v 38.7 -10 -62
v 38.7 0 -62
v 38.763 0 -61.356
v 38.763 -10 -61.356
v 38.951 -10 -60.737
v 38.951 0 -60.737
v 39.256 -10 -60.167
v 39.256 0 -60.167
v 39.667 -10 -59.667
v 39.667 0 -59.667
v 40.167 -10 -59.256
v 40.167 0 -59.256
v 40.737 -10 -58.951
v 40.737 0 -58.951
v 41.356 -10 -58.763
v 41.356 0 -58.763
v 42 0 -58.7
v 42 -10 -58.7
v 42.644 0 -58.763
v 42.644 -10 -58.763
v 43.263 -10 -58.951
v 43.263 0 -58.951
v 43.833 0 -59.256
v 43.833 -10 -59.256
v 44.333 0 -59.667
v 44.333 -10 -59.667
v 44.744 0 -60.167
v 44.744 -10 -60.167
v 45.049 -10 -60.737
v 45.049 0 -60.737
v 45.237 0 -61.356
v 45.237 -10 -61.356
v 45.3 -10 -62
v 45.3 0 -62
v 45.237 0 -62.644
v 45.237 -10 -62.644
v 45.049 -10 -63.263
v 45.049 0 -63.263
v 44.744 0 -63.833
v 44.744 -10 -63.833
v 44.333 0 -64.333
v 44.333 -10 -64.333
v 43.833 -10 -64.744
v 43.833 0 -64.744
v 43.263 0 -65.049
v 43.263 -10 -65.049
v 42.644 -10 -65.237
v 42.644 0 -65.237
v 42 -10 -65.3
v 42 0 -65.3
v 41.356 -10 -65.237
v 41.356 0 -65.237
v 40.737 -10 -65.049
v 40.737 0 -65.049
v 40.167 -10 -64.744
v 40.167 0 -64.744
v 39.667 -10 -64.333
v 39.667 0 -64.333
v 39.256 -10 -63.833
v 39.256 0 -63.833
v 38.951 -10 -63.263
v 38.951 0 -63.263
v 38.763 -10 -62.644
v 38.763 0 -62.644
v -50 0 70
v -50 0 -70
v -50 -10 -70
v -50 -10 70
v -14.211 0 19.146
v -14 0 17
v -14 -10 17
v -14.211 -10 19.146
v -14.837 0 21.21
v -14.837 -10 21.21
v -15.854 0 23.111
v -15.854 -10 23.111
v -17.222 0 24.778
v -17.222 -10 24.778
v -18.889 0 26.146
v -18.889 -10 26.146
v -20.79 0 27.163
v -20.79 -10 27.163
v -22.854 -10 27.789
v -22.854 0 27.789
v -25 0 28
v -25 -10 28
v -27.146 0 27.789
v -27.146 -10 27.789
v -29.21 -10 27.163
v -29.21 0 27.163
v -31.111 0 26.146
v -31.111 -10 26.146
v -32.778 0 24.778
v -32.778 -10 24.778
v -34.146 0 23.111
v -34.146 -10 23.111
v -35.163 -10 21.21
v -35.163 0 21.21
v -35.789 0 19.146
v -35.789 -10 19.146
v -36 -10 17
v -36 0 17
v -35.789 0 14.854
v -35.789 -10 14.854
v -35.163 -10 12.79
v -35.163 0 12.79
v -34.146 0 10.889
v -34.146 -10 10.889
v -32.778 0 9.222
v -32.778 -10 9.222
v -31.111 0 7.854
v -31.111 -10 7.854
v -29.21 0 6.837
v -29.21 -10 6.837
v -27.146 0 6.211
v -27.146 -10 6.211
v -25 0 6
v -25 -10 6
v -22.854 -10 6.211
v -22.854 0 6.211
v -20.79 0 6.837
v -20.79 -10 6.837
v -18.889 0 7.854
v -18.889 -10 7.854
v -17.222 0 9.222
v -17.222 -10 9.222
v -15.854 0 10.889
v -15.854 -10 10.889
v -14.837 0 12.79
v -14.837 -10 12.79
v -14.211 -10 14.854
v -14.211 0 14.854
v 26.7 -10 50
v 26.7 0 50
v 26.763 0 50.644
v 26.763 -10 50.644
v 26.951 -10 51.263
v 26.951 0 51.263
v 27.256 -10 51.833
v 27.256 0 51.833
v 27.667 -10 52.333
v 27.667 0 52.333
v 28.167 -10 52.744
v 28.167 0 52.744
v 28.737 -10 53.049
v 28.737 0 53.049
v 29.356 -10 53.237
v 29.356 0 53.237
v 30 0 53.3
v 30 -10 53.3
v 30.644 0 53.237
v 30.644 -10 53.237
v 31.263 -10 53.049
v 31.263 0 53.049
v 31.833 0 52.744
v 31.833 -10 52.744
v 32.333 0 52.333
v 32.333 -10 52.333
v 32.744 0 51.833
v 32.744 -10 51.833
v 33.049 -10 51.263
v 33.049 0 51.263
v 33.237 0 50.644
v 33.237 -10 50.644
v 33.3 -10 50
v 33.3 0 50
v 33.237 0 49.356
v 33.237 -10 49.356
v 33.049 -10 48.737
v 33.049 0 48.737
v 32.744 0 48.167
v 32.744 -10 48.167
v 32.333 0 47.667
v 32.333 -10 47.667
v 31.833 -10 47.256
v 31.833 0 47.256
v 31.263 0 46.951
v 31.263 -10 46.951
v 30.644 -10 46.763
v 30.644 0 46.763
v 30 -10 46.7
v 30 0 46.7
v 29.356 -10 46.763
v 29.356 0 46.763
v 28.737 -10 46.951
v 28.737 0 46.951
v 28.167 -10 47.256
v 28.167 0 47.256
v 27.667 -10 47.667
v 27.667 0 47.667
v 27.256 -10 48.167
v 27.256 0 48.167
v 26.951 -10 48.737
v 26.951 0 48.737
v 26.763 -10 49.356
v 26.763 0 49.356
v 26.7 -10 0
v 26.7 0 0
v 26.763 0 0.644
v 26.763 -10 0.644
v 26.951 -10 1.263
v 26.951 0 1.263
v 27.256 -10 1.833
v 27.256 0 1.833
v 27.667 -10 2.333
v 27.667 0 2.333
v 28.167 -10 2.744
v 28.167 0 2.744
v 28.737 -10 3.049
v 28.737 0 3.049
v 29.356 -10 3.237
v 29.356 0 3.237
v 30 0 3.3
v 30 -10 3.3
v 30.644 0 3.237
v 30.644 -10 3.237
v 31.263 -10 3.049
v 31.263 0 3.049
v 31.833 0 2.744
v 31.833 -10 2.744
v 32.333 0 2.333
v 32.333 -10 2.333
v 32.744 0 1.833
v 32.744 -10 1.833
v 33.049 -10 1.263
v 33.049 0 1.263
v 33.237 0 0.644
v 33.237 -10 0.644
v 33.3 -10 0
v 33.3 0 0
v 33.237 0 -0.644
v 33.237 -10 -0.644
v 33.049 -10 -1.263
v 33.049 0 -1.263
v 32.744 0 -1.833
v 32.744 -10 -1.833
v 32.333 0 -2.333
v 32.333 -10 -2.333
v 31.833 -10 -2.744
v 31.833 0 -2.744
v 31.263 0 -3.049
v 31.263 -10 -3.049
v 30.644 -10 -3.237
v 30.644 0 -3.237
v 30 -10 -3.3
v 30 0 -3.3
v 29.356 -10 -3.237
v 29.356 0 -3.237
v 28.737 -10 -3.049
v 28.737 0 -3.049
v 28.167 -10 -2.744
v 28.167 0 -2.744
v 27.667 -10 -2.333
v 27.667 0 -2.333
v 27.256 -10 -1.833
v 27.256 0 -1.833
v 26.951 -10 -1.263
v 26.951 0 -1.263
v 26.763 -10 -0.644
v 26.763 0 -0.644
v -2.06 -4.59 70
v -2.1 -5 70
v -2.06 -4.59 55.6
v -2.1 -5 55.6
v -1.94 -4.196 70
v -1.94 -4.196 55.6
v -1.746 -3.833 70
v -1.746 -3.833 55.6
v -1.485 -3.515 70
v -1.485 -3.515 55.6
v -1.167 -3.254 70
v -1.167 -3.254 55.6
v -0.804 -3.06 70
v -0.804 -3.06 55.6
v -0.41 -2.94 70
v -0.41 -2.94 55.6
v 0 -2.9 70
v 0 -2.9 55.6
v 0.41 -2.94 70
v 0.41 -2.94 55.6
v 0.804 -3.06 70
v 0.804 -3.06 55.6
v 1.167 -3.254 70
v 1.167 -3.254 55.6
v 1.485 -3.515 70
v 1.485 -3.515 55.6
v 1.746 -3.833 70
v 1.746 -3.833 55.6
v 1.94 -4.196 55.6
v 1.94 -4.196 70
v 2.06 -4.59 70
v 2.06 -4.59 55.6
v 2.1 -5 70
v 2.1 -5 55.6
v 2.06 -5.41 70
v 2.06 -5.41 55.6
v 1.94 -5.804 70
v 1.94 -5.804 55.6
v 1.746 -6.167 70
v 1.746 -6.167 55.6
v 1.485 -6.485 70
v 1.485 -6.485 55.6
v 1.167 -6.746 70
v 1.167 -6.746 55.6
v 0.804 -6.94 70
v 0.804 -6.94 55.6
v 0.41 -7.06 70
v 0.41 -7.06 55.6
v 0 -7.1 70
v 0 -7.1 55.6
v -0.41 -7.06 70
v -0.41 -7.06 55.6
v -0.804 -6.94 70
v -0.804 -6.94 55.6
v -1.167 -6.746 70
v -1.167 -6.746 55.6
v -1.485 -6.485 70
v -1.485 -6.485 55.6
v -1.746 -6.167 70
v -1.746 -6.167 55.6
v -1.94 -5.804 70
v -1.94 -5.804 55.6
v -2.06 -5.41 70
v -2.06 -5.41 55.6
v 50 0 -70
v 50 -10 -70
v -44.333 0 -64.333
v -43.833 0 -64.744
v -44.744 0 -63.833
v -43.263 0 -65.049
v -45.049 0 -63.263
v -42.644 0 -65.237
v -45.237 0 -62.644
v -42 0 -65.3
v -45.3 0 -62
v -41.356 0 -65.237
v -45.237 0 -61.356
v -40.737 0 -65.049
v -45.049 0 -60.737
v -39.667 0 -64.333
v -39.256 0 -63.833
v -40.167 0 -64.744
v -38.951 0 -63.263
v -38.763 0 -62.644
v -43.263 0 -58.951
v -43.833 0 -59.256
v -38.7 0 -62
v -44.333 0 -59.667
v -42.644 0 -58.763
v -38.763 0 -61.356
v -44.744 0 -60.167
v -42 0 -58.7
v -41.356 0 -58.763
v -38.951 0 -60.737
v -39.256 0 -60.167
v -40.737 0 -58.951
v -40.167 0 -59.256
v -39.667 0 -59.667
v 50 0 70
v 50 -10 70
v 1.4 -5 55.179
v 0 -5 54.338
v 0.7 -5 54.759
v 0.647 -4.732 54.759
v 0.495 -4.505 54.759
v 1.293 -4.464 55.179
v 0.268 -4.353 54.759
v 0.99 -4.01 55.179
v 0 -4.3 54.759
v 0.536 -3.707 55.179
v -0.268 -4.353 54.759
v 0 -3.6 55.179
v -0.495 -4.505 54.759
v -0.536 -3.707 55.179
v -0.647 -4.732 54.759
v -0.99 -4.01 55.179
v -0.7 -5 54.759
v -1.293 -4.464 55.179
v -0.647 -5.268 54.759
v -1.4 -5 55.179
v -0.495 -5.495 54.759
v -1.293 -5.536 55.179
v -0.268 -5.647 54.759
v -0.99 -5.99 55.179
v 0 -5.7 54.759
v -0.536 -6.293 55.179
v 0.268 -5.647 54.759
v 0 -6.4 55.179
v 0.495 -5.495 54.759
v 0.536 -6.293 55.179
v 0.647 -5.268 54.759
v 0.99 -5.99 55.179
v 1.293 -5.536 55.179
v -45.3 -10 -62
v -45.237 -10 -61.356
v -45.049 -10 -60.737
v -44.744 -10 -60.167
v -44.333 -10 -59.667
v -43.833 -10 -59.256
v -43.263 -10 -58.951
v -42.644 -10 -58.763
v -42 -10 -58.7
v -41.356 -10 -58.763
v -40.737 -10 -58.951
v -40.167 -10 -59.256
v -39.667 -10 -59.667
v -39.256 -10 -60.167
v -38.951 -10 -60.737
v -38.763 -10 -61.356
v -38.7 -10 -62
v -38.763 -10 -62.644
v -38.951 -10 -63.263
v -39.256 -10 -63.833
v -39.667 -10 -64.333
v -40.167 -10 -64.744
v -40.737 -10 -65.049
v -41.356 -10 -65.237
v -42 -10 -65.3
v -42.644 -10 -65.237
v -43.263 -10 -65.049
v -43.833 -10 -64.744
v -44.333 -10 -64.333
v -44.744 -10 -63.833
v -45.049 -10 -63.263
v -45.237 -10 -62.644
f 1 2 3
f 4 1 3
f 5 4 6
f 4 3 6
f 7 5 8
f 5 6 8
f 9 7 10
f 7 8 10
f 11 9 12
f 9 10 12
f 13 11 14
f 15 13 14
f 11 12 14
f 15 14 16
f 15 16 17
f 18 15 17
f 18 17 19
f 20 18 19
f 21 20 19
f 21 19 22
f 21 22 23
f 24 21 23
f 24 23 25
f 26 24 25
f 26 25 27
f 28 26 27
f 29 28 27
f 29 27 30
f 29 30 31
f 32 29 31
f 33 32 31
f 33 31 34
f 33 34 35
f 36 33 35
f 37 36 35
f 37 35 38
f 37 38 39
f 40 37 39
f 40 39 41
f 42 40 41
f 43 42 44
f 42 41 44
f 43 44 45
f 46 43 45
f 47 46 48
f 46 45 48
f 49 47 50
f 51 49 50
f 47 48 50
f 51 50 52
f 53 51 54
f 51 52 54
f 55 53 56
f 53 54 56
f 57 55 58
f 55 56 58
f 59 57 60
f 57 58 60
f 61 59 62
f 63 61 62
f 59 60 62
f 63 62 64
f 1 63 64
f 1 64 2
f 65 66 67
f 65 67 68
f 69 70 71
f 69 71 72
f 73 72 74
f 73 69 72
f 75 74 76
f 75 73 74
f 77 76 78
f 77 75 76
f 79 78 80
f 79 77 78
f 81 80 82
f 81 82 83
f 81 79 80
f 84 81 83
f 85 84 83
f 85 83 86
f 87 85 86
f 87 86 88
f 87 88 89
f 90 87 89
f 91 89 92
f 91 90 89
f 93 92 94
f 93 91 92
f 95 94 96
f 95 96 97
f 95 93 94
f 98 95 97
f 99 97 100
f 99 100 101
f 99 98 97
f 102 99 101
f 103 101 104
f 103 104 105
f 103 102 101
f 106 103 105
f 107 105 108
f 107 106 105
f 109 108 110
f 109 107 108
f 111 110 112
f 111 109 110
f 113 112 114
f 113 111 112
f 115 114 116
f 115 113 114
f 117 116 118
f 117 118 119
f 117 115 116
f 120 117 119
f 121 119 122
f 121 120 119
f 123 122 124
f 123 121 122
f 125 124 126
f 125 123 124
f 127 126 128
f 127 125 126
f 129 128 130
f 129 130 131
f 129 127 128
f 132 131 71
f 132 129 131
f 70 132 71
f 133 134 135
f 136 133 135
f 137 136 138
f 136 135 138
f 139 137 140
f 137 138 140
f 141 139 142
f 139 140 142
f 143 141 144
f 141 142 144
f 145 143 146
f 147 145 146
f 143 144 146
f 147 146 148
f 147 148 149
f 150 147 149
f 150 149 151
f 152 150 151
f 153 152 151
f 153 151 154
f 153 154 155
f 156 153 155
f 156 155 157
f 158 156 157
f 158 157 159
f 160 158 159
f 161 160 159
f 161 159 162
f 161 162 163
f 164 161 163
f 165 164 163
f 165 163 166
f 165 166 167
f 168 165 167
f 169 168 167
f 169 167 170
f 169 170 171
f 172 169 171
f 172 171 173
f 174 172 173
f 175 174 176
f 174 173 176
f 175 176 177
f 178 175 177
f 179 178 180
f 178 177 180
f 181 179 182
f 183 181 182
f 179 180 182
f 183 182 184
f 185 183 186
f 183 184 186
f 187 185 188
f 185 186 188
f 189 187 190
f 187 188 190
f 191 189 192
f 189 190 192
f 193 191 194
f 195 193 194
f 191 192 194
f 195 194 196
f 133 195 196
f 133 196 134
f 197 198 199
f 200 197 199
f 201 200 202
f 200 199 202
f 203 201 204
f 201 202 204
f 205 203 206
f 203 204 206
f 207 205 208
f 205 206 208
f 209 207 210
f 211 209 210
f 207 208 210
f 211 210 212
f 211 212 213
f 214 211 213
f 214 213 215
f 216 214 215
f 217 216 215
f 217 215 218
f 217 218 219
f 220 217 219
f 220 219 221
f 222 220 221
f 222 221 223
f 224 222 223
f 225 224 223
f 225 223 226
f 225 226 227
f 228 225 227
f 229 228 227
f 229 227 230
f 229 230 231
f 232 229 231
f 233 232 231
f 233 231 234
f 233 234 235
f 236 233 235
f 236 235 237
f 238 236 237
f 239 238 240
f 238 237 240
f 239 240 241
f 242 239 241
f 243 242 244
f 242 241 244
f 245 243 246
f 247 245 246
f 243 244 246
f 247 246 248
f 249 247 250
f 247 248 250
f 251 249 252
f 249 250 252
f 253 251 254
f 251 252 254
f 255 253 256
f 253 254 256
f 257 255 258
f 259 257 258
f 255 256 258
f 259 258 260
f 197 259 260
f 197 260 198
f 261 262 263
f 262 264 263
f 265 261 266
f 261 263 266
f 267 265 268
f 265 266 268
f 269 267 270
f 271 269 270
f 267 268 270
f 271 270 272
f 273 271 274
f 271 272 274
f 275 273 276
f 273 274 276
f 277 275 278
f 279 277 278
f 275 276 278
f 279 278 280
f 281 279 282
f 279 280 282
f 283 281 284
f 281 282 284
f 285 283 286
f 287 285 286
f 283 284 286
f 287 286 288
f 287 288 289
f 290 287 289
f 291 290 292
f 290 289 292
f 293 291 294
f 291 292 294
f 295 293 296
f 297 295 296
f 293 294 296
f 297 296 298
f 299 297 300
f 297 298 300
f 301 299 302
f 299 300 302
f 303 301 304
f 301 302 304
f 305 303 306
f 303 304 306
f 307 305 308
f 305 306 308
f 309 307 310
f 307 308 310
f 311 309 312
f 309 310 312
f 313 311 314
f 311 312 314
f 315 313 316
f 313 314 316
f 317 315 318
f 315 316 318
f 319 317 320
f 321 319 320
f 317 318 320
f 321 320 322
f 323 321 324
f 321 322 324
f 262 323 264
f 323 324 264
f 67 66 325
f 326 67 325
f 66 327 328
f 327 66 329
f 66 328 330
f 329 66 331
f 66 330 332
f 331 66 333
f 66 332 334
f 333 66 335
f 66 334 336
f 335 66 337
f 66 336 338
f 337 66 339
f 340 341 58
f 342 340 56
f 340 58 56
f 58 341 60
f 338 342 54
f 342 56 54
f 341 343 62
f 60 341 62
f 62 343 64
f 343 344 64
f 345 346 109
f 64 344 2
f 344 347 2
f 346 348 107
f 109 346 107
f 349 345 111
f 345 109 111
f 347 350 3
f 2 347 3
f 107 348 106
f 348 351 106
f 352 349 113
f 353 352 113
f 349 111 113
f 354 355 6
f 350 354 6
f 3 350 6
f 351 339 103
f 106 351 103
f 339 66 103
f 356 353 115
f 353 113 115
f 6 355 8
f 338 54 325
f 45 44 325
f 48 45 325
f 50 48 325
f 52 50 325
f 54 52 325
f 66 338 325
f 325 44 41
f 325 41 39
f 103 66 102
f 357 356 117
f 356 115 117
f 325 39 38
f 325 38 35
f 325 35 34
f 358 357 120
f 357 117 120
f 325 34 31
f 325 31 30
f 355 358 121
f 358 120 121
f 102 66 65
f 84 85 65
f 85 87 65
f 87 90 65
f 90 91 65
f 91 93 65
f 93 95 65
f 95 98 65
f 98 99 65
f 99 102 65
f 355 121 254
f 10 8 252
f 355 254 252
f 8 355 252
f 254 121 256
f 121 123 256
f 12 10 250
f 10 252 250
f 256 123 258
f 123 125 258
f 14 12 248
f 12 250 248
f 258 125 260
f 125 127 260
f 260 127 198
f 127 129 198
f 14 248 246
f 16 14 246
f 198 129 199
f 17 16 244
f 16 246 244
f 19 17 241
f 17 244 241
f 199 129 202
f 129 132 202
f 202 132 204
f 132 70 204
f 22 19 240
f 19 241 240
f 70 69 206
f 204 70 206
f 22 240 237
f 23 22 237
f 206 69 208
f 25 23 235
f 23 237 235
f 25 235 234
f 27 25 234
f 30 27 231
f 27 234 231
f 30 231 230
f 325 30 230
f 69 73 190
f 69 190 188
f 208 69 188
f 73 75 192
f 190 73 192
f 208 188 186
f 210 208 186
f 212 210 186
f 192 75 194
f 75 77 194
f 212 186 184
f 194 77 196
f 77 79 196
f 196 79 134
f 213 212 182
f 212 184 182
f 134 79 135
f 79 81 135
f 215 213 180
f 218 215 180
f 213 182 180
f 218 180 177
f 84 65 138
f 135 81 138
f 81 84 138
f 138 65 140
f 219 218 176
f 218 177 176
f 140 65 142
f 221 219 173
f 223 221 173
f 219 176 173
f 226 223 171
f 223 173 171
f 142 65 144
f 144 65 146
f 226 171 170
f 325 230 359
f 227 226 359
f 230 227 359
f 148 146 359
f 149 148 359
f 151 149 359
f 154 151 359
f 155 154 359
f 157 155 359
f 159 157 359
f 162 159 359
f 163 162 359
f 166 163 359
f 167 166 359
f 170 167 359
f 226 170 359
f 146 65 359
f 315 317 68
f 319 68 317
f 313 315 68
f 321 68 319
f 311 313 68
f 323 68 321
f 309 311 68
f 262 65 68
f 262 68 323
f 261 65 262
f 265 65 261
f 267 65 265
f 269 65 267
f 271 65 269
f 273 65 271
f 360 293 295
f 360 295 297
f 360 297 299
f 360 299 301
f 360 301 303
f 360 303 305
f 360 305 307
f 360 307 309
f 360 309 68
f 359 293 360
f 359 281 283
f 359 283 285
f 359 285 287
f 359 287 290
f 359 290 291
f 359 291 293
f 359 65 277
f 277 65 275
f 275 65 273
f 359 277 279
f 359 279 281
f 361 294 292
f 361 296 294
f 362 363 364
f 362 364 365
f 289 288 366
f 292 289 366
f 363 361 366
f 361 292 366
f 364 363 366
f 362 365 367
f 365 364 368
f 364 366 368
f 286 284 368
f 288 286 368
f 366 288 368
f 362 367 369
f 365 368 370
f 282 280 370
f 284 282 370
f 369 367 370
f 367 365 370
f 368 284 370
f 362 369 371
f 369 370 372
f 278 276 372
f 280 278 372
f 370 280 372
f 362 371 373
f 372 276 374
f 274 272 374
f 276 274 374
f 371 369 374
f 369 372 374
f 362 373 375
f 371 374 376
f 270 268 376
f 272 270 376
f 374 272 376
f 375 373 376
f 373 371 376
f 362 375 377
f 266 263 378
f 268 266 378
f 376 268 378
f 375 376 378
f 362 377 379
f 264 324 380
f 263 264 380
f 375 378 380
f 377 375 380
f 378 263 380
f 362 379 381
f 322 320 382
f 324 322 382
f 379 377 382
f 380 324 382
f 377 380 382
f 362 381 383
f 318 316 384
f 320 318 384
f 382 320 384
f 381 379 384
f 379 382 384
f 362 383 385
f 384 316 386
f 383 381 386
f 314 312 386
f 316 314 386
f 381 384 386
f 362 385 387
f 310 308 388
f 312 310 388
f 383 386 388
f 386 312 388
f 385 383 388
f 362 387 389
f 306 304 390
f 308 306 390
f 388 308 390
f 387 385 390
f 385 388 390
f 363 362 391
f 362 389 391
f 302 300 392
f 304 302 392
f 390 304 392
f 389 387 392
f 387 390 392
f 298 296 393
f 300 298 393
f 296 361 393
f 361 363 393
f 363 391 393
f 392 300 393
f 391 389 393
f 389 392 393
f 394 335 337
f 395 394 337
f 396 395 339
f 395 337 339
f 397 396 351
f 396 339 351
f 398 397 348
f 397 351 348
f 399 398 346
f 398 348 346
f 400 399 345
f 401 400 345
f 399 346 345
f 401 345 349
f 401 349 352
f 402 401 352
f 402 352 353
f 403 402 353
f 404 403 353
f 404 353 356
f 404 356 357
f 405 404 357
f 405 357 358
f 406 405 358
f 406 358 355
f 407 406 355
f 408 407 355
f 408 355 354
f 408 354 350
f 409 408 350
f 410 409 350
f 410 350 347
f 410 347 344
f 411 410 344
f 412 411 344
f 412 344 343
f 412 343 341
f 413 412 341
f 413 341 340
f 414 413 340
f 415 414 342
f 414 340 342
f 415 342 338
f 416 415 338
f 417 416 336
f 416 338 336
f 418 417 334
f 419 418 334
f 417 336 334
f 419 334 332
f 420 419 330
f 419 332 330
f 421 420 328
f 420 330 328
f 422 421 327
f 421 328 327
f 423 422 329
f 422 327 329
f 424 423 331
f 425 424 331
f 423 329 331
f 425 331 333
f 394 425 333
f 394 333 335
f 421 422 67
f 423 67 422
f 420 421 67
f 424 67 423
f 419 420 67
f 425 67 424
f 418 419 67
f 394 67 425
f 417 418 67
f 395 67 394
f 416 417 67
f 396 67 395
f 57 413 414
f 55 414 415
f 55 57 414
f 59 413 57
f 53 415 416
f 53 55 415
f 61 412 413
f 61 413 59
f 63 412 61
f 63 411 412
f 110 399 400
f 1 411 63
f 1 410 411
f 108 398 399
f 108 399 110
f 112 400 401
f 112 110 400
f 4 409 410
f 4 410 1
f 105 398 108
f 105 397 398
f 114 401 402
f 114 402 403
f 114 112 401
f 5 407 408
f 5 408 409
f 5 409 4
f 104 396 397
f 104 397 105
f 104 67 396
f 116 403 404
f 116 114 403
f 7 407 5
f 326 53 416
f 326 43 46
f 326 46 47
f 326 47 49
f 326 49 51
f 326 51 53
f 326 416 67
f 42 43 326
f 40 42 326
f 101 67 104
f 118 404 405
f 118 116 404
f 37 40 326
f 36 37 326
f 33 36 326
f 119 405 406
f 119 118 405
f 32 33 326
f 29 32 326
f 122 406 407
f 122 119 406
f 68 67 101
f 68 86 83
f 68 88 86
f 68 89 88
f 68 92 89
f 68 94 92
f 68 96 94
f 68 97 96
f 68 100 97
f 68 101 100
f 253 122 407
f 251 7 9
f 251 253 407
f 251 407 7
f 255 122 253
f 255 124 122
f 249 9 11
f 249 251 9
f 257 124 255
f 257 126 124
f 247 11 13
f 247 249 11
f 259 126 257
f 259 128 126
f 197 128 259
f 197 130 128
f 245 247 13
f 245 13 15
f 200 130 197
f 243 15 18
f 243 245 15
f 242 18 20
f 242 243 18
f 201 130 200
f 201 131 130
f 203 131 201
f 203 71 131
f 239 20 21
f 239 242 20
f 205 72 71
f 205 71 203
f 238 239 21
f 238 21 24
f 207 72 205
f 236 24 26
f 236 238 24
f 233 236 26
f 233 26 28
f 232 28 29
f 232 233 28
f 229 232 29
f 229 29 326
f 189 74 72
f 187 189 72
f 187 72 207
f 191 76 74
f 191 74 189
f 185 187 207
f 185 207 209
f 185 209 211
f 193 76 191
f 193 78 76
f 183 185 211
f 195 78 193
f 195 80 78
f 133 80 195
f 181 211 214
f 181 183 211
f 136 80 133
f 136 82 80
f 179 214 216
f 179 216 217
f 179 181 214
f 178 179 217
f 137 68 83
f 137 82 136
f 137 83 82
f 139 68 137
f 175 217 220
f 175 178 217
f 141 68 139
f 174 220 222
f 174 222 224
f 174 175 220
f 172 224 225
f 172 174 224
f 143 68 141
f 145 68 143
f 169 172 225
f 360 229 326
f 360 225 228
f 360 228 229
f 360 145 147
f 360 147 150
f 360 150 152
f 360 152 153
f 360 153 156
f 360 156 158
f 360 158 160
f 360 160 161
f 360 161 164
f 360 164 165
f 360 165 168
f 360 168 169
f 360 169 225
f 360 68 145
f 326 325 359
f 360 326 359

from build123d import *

# Parameters (mm, degrees)
F0_W     = 100
F0_H     = 140
F0_R     = 11
F1_DEPTH = 10
F4_D     = 4.2
F4_DEPTH = 14.4
F4_TIP   = 1.2618073
F5_D     = 6.6


with BuildPart() as f1:
    # F0 (on Front) → F1 (new body)
    with BuildSketch(Plane.XZ):
        Rectangle(F0_W, F0_H)
        with Locations((-25, 17)):
            Circle(F0_R, mode=Mode.SUBTRACT)
    extrude(amount=F1_DEPTH)

    # F4
    with Locations(Plane.XY.offset(70)):
        with Locations((0, -5)):
            Hole(F4_D / 2, depth=F4_DEPTH)
            with Locations((0, 0, -(F4_DEPTH + F4_TIP / 2))):  # 118° drill point
                Cone(0, F4_D / 2, F4_TIP, mode=Mode.SUBTRACT)

    # F5 (through all)
    with Locations(Plane.XZ.offset(10)):
        with Locations((30, 50), (30, 0), (-42, -62), (42, -62)):
            Hole(F5_D / 2)


solid = f1.part
